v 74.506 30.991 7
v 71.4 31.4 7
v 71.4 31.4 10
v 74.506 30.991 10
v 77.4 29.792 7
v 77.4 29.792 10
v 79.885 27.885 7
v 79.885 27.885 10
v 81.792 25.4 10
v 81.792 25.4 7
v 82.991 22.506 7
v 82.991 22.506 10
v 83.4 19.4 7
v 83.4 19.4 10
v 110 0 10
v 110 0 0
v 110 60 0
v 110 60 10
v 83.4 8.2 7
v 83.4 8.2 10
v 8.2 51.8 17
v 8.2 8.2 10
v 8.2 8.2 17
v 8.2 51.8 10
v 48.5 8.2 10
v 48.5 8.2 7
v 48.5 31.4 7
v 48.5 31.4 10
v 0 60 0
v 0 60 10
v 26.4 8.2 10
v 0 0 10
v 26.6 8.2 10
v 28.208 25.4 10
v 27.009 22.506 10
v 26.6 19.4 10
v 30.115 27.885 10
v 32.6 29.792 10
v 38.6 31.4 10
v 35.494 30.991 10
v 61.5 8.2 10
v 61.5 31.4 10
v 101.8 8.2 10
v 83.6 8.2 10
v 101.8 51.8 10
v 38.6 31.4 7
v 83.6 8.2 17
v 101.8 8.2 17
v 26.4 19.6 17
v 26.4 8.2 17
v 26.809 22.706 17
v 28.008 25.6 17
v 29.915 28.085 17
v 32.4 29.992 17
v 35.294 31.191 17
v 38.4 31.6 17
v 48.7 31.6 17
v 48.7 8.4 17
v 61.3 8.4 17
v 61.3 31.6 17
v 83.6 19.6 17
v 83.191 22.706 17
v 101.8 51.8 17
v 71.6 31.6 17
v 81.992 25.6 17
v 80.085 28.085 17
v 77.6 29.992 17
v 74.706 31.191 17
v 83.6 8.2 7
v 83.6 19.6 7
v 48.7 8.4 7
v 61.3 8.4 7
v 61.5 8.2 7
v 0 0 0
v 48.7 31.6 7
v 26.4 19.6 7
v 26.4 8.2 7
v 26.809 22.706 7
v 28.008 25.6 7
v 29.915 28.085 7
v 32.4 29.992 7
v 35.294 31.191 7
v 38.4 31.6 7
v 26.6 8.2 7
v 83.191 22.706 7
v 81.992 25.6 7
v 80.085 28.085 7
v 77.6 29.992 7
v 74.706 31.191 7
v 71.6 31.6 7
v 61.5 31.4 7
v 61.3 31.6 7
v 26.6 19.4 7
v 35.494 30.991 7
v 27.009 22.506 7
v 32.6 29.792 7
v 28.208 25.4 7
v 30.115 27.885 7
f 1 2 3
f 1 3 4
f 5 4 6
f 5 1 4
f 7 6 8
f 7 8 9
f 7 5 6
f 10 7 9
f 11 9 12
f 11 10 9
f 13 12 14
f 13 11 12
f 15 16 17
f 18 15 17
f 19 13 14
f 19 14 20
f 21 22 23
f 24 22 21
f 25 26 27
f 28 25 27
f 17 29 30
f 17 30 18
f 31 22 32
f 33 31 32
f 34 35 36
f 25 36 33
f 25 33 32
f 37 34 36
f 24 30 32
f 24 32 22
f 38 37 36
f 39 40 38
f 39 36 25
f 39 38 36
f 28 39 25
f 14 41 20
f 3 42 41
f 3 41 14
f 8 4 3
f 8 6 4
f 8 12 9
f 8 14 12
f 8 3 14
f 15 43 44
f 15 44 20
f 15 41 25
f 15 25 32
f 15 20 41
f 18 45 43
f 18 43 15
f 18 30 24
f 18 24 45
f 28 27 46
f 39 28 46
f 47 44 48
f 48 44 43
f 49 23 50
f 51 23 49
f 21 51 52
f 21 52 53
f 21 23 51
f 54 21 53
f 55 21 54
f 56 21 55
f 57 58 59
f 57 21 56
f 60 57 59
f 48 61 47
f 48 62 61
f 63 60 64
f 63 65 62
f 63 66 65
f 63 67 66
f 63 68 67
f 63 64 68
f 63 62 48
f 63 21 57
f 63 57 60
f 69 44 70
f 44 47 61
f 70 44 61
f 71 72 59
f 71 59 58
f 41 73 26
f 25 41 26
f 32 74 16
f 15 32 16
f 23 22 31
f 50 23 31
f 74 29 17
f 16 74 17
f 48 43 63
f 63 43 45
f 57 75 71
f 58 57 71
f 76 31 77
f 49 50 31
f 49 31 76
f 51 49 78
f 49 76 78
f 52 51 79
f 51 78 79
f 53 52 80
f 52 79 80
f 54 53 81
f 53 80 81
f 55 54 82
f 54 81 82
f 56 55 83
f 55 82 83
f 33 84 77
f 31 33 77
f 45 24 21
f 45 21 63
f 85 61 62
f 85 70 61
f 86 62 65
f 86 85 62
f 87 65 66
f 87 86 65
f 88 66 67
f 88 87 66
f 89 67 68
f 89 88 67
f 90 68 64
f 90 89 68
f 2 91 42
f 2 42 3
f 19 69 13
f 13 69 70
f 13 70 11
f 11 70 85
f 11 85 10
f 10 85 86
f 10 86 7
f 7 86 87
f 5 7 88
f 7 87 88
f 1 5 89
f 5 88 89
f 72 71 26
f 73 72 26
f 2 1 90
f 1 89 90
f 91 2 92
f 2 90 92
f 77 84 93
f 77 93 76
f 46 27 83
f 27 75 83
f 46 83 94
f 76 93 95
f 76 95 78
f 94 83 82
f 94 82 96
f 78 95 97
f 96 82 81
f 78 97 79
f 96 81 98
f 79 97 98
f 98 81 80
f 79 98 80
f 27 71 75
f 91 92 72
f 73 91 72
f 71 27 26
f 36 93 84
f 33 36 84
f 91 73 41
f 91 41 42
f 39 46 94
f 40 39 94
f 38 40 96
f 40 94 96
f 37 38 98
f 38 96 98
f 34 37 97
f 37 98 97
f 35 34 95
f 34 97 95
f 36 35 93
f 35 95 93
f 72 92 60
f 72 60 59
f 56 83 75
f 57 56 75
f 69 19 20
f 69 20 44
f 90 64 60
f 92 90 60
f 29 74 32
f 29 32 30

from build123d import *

# Parameters (mm, degrees)
SKETCH1_W            = 110
SKETCH1_H            = 60
BOSS_EXTRUDE1_DEPTH  = 10
SKETCH2_W            = 93.6
SKETCH2_H            = 43.6
BOSS_EXTRUDE3_DEPTH  = 7
SKETCH3_W            = 22.1
SKETCH3_H            = 23.4
CUT_EXTRUDE1_DEPTH   = 7
FILLET1_R            = 12
FILLET1_OF_MIRROR1_R = 12
CUT_EXTRUDE3_START   = -10
CUT_EXTRUDE3_DEPTH   = 10


# Read off the part's stored shape, not the designer's step: Cut-Extrude3
with BuildPart() as part:
    # Sketch1 → Boss-Extrude1 (new body)
    with BuildSketch(Plane.XY):
        with Locations((55, 30)):
            Rectangle(SKETCH1_W, SKETCH1_H)
    extrude(amount=BOSS_EXTRUDE1_DEPTH)

    # Sketch2 → Boss-Extrude3 (add)
    with BuildSketch(Plane.XY.offset(10)):
        with Locations((55, 30)):
            Rectangle(SKETCH2_W, SKETCH2_H)
    extrude(amount=BOSS_EXTRUDE3_DEPTH)

    # Sketch3 → Cut-Extrude1 (cut)
    with BuildSketch(Plane.XY.offset(17)):
        with Locations((37.45, 19.9)):
            Rectangle(SKETCH3_W, SKETCH3_H)
    cut_extrude1 = extrude(amount=-CUT_EXTRUDE1_DEPTH, mode=Mode.SUBTRACT)

    # Fillet1
    fillet1_edges = [part.edges().sort_by_distance(p)[0] for p in [
        (26.4, 31.6, 13.5),
    ]]
    fillet(fillet1_edges, radius=FILLET1_R)

    # Mirror1: Cut-Extrude1 across plane
    add(cut_extrude1.mirror(Plane(origin=(55, 0, 0), x_dir=(0, 0, 1), z_dir=(1, 0, 0))), mode=Mode.SUBTRACT)

    # Fillet1 of Mirror1
    fillet1_of_mirror1_edges = [part.edges().sort_by_distance(p)[0] for p in [
        (83.6, 31.6, 13.5),
    ]]
    fillet(fillet1_of_mirror1_edges, radius=FILLET1_OF_MIRROR1_R)

    # Cut-Extrude3 outline → Cut-Extrude3 (cut)
    with BuildSketch(Plane.XY.offset(17).offset(CUT_EXTRUDE3_START)):
        with BuildLine():
            Line((61.3, 31.6), (61.3, 8.4))
            Line((61.3, 8.4), (55, 8.4))
            Line((55, 8.4), (55, 8.2))
            Line((55, 8.2), (61.5, 8.2))
            Line((61.5, 8.2), (61.5, 31.4))
            Line((61.5, 31.4), (71.4, 31.4))
            ThreePointArc((71.4, 31.4), (79.885281374, 27.885281374), (83.4, 19.4))
            Line((83.4, 19.4), (83.4, 8.2))
            Line((83.4, 8.2), (83.6, 8.2))
            Line((83.6, 8.2), (83.6, 19.6))
            ThreePointArc((83.6, 19.6), (80.085281374, 28.085281374), (71.6, 31.6))
            Line((71.6, 31.6), (61.3, 31.6))
        make_face()
    cut_extrude3 = extrude(amount=CUT_EXTRUDE3_DEPTH, mode=Mode.SUBTRACT)

    # Mirror2: Cut-Extrude3 across plane
    add(cut_extrude3.mirror(Plane(origin=(55, 0, 0), x_dir=(0, 0, 1), z_dir=(1, 0, 0))), mode=Mode.SUBTRACT)


solid = part.part
